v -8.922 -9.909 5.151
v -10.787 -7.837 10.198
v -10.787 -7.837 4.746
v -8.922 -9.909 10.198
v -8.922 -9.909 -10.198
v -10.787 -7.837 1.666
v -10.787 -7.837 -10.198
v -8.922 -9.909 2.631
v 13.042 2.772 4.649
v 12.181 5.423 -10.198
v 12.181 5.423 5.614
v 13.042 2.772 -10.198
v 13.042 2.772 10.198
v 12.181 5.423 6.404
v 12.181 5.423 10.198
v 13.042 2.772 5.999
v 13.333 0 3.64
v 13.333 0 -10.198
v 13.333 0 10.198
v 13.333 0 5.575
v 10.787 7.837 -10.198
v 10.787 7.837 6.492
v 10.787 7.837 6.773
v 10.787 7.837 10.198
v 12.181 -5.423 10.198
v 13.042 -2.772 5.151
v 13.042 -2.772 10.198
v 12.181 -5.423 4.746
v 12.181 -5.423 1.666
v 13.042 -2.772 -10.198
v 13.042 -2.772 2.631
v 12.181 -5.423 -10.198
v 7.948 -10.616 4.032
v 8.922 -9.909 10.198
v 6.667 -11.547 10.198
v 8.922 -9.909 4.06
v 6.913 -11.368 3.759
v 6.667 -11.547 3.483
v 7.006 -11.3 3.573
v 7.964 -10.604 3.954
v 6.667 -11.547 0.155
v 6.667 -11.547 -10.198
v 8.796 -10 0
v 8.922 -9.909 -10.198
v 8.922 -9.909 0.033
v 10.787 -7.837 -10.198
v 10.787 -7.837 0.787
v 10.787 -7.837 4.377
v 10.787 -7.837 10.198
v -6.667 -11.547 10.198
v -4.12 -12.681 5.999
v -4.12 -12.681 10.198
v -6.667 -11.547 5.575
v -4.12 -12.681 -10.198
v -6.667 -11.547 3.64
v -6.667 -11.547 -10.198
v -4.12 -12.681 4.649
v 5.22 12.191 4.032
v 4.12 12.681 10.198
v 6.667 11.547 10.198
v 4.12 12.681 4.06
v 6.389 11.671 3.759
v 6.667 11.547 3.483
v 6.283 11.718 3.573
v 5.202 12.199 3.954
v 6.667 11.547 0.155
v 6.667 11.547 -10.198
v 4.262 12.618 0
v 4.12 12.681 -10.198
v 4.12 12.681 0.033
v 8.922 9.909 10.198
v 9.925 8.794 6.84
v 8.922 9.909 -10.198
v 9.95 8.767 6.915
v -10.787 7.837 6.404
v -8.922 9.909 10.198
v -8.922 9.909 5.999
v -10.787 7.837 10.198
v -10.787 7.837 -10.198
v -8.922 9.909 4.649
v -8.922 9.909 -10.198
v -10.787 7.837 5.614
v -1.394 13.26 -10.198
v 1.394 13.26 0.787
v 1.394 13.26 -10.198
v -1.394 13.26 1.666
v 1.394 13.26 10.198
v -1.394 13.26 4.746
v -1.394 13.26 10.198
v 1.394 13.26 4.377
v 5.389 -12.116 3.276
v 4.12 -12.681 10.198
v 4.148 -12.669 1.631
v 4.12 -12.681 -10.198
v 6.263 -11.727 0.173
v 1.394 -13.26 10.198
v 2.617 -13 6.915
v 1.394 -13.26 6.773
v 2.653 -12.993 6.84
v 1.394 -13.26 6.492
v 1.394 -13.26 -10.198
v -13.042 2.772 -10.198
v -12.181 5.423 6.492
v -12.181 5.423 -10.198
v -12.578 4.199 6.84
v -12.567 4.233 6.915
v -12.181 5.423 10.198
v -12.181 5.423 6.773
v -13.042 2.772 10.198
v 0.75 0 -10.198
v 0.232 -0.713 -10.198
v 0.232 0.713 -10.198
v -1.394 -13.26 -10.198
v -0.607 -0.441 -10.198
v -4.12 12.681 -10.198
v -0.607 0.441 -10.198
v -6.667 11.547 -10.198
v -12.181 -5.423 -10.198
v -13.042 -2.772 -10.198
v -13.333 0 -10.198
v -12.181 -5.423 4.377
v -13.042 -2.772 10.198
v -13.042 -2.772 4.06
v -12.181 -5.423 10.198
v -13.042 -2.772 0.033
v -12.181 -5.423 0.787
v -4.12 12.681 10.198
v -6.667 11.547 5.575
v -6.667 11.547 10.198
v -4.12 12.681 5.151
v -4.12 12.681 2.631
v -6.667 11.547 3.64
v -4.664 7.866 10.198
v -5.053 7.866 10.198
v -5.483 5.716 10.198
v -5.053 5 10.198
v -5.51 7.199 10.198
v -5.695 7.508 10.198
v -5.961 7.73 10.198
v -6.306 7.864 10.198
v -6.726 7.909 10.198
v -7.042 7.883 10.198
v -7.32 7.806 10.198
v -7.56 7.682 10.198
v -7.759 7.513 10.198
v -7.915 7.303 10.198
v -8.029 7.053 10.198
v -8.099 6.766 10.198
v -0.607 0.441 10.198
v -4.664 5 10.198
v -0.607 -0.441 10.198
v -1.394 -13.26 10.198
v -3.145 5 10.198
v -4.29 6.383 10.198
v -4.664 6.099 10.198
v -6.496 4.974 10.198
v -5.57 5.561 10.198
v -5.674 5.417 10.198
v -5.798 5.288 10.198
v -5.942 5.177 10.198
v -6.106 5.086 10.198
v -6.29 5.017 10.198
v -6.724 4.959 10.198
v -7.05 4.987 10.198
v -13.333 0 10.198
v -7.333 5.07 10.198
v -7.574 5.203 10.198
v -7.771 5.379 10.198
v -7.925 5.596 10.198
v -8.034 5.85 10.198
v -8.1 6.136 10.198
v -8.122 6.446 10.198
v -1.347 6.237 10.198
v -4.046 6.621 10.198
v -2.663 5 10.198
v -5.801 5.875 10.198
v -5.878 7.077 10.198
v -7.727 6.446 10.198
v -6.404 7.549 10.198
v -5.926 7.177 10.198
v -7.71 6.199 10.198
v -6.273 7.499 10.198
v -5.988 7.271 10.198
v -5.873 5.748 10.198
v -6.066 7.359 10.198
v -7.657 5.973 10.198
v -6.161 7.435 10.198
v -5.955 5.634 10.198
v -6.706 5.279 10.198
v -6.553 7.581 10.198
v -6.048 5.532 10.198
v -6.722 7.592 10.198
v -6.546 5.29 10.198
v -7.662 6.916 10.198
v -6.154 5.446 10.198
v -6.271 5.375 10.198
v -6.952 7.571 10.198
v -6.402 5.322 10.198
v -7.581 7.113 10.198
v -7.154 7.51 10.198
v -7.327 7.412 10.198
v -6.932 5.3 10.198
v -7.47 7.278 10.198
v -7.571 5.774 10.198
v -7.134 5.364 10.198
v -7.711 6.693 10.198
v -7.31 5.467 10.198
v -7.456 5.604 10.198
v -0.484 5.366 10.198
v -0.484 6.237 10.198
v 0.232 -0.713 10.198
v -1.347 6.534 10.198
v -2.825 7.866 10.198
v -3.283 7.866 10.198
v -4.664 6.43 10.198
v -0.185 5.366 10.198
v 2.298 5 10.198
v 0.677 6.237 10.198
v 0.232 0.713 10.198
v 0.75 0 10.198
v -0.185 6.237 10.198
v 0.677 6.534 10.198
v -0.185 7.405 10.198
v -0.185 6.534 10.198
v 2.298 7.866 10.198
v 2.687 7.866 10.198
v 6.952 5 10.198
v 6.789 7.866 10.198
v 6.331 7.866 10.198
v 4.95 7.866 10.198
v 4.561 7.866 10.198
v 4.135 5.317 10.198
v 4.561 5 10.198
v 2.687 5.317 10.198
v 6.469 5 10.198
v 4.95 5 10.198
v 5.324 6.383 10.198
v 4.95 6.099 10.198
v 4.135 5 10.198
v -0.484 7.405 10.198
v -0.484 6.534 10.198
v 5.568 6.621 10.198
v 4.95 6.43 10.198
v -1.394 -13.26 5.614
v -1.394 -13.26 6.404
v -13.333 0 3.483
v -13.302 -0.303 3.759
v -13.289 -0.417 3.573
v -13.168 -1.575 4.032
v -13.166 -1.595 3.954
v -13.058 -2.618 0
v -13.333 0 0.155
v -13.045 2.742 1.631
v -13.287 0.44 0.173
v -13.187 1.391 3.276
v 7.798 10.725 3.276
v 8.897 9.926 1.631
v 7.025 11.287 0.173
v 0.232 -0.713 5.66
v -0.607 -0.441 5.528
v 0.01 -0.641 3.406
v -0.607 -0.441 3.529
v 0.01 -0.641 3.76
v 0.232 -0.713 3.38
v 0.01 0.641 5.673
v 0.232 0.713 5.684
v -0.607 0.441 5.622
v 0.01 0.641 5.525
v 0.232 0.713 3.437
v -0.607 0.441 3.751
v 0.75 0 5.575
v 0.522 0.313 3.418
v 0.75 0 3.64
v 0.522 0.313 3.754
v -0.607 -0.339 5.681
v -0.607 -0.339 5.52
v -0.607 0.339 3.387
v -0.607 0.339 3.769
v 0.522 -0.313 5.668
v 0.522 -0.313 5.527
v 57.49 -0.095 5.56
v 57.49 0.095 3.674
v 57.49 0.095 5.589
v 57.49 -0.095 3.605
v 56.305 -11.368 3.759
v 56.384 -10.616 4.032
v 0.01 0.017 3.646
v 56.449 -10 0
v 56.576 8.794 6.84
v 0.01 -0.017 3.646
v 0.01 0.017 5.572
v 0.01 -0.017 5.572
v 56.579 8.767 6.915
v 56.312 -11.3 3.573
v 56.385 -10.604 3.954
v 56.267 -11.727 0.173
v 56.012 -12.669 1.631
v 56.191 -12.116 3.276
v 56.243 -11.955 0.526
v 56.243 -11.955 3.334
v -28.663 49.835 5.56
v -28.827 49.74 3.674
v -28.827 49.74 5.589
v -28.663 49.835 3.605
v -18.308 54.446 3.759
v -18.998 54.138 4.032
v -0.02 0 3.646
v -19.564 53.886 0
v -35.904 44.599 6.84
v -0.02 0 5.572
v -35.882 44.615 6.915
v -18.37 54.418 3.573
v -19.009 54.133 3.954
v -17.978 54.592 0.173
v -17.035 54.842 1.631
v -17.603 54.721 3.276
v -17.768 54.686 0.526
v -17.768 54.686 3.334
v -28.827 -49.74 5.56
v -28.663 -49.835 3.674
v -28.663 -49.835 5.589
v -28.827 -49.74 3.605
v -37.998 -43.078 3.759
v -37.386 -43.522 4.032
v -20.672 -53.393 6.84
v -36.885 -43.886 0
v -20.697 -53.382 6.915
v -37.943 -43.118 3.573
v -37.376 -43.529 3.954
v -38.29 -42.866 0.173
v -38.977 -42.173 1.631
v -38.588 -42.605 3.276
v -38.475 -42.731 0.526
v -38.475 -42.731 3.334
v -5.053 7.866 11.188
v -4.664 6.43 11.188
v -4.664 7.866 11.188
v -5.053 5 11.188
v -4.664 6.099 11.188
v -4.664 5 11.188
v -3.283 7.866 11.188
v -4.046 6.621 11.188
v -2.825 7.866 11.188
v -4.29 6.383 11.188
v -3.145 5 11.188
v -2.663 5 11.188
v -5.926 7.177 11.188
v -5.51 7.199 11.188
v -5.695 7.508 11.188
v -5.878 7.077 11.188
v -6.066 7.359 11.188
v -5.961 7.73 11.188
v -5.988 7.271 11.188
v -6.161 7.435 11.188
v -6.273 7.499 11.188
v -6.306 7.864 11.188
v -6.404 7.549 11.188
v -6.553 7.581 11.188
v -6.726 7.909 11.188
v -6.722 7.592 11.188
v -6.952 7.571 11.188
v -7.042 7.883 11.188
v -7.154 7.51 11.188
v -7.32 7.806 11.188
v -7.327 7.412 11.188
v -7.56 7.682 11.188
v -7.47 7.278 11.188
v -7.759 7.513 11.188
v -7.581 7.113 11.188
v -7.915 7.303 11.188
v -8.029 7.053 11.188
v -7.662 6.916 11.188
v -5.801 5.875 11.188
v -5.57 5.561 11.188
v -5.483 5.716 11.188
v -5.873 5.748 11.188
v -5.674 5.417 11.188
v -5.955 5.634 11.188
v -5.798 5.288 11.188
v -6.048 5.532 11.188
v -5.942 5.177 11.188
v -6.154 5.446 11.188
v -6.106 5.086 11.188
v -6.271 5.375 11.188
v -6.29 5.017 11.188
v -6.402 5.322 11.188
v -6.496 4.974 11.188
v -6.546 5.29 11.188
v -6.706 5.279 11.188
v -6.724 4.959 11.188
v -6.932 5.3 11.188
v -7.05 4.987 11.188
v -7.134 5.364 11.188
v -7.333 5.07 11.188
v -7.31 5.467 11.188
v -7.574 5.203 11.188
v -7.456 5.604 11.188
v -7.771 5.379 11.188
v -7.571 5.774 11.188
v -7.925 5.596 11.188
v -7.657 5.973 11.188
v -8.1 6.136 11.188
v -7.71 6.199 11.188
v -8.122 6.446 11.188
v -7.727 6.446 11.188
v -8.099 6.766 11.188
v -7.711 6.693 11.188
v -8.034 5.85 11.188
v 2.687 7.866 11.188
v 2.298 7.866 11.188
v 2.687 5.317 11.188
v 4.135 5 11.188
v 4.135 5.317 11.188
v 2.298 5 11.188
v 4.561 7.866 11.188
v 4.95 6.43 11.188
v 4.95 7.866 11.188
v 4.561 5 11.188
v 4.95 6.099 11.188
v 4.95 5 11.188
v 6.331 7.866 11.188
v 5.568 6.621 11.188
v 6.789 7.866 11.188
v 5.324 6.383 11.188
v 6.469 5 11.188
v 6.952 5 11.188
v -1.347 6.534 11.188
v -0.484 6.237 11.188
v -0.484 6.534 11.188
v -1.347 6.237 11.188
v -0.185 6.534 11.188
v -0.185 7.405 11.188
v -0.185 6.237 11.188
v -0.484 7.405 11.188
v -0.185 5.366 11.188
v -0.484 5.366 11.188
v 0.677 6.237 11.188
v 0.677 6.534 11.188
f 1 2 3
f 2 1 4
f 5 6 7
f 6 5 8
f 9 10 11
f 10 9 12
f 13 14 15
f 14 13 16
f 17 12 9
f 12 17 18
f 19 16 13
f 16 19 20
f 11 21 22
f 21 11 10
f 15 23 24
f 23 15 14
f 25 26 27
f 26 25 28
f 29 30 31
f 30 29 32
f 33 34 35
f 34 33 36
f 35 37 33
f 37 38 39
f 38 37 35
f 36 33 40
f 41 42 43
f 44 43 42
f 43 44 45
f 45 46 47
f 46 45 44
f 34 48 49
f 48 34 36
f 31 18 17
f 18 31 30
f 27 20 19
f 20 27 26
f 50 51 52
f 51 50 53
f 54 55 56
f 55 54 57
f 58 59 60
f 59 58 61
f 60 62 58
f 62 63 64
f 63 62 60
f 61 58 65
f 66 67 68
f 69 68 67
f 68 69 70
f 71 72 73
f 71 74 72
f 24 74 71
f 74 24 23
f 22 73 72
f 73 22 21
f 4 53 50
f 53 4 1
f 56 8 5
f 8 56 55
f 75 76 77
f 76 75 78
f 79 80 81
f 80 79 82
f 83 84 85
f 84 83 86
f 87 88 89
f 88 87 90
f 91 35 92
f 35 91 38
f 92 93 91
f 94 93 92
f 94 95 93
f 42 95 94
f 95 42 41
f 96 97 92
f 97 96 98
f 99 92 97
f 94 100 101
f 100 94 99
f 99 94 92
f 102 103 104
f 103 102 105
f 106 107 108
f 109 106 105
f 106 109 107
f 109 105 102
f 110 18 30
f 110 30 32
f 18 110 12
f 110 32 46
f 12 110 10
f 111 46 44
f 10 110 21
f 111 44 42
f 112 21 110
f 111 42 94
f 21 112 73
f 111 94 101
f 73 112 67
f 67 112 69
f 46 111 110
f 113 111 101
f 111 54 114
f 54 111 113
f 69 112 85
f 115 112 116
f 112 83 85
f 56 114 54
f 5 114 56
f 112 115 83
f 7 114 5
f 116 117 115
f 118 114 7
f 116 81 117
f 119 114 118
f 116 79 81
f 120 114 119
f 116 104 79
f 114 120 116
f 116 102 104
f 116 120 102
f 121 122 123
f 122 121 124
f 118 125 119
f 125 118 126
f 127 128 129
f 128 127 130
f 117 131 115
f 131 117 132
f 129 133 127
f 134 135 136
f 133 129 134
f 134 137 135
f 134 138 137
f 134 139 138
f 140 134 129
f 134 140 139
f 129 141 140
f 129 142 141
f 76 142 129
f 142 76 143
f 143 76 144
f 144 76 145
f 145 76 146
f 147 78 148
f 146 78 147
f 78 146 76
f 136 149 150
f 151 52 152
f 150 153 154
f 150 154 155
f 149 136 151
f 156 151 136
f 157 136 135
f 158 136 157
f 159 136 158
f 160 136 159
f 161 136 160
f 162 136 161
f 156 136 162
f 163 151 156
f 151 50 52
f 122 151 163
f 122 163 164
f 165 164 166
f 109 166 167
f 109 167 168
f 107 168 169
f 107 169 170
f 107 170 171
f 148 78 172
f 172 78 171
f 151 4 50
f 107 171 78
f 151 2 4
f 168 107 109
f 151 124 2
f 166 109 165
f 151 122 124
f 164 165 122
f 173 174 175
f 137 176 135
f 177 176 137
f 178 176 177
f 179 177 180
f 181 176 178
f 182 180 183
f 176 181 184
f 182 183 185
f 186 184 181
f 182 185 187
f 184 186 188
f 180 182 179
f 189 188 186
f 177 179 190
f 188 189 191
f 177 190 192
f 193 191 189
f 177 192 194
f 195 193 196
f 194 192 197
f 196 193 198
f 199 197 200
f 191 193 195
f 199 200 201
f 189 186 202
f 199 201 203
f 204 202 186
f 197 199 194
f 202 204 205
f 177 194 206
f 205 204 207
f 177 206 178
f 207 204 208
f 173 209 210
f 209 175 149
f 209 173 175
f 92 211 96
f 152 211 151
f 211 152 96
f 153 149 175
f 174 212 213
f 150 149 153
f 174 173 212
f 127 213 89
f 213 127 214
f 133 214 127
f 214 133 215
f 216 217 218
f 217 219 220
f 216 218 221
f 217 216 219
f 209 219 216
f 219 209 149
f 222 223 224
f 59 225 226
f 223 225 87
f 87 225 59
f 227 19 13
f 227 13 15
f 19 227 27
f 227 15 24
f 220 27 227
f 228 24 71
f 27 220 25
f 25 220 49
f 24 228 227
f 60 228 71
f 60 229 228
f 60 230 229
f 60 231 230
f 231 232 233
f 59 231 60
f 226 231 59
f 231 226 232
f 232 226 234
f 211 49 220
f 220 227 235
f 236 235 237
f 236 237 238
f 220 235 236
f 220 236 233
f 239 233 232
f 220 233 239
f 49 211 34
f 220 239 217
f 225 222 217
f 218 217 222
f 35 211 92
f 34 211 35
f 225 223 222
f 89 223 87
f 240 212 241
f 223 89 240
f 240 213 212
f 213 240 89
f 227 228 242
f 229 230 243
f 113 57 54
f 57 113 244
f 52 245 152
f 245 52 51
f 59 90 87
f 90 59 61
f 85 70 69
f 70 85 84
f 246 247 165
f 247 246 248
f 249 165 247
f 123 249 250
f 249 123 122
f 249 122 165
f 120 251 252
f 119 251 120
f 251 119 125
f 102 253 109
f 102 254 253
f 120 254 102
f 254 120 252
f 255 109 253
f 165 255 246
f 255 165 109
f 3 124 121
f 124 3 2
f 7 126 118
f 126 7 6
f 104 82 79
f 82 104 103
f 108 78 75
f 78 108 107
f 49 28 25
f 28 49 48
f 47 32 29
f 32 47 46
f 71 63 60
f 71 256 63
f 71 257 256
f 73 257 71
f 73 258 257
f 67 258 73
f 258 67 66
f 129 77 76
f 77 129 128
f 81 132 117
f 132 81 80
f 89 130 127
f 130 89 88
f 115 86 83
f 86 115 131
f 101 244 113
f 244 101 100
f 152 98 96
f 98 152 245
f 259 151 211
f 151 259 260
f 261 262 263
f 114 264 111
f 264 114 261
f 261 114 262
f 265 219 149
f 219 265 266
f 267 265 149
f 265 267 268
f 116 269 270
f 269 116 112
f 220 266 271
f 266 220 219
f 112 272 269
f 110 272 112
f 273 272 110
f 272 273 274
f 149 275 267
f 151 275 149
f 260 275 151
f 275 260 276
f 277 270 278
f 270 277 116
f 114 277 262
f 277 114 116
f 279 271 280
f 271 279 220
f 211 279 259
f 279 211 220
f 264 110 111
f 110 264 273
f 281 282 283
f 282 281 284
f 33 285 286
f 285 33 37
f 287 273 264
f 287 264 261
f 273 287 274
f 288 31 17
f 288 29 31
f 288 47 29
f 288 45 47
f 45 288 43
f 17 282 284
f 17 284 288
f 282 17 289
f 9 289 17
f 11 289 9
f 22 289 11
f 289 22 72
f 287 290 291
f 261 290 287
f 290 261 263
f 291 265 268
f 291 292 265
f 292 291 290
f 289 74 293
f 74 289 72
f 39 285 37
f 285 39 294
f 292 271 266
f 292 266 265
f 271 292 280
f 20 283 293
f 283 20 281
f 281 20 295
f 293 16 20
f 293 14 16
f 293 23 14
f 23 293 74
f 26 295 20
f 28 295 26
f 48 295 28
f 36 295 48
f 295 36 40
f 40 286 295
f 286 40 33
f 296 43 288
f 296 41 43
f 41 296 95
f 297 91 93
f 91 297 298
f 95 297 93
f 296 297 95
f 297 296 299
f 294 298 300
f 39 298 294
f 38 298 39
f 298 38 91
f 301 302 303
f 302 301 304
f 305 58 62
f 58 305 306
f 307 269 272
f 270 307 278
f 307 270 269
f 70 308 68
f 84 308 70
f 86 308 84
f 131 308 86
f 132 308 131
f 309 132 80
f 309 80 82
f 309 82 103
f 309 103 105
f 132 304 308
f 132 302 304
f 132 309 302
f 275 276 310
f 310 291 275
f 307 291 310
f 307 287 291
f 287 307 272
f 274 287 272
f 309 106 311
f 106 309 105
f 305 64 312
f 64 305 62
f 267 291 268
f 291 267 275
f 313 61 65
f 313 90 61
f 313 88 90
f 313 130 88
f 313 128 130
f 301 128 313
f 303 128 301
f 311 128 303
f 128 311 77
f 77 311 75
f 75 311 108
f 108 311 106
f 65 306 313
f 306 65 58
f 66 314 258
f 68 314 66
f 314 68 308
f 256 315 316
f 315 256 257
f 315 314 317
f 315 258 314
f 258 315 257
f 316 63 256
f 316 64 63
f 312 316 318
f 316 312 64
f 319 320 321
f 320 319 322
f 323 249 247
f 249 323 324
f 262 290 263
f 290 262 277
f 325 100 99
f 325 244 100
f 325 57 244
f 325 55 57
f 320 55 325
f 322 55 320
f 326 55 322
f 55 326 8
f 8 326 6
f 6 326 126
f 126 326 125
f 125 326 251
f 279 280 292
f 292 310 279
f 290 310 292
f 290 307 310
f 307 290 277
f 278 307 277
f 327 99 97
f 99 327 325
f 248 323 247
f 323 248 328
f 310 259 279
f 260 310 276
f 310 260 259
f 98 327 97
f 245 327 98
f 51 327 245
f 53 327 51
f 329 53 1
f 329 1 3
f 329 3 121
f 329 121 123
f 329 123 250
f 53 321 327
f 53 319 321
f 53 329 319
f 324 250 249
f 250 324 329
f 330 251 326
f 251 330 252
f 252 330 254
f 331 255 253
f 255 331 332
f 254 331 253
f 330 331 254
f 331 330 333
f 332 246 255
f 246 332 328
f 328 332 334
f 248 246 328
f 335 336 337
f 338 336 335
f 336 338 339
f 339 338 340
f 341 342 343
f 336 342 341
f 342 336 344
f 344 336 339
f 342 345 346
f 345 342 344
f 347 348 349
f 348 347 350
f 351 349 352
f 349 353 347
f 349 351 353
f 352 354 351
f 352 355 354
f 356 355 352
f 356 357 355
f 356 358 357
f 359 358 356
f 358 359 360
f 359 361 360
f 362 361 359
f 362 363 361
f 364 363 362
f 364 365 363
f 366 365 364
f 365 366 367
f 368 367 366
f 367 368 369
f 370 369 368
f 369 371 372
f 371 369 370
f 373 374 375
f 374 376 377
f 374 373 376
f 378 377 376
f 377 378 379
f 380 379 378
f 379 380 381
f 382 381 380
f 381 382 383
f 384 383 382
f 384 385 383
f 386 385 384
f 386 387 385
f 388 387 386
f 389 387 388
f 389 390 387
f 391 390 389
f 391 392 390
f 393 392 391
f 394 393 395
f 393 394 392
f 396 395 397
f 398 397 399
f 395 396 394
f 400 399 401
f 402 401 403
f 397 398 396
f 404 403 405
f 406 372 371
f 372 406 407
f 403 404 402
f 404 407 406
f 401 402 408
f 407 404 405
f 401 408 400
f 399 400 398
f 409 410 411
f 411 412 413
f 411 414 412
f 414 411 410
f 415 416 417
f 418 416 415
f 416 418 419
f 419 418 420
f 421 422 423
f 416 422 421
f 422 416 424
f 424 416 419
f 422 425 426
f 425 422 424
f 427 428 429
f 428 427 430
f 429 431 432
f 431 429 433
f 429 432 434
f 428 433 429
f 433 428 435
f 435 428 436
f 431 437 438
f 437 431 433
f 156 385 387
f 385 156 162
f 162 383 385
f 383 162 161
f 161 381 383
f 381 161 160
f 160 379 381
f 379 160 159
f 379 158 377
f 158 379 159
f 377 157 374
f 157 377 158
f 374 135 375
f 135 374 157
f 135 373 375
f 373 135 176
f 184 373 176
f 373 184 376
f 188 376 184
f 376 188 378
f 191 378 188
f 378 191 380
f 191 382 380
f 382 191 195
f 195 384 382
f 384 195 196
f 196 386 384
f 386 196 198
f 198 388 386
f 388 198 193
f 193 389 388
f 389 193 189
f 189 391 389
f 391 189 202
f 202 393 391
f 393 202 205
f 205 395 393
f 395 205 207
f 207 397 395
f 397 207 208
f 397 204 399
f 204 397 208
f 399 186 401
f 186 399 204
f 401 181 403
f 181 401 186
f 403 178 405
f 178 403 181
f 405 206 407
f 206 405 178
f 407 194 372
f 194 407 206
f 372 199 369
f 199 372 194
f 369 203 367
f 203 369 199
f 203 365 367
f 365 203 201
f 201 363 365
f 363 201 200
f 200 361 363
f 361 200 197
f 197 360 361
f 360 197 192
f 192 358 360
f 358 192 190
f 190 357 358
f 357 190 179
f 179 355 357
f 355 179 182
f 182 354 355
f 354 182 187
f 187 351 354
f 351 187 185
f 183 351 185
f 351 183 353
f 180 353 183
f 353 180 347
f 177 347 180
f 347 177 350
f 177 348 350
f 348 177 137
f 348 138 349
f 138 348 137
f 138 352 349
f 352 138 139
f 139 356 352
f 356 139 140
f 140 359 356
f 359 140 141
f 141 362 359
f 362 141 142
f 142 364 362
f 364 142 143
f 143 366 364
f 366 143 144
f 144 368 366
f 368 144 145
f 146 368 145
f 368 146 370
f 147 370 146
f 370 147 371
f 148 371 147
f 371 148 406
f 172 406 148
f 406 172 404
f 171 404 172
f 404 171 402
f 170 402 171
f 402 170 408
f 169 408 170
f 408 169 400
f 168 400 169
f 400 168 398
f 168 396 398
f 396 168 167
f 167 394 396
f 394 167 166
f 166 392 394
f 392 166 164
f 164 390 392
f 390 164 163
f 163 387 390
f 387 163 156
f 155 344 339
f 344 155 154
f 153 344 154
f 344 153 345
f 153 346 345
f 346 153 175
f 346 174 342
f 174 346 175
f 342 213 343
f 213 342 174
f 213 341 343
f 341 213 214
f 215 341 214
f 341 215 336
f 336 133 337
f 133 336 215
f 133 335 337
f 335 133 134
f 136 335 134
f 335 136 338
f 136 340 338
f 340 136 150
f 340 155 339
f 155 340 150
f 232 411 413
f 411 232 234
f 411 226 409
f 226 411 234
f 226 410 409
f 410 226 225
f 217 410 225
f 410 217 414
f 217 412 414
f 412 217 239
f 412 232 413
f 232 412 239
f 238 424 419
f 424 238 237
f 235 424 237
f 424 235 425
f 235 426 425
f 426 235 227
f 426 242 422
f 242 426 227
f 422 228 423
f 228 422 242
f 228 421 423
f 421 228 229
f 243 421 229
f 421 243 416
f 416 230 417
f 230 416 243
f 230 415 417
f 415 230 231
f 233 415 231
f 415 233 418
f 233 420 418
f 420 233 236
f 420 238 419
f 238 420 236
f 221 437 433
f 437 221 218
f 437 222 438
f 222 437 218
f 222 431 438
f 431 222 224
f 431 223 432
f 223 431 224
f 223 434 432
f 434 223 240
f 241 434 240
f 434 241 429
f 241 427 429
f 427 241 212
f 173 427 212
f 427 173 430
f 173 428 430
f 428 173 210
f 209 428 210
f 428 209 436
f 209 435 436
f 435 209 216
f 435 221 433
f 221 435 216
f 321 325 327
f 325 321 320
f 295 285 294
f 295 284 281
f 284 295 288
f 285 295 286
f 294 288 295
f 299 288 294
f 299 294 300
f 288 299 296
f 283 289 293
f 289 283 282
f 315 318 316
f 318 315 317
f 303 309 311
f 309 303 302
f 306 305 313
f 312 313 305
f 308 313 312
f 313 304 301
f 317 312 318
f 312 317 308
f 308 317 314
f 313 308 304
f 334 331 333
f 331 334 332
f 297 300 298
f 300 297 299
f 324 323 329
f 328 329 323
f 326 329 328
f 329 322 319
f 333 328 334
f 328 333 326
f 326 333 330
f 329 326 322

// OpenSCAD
// Works in openSCAD 2015.03+ || Last updated Oct 2, 2016



// ##################################################
// GLOBALS
// ##################################################


//all units are in mm.
//for inches: <amount in inches> / I
I = 25.4;

NUMBER_BLADES   = 3;
PITCH_ANGLE     = 20;
BLADE_LEN       = 100;
PROP_DIAMETER   = 115;   // whole thing
SHAFT_DIAMETER  = 1.5;
BLADE_THICKNESS = 4;     // at thickest point
BLADE_WIDTH     = 20;

// No touchie.
BLADE_LENGTH    = PROP_DIAMETER/2; //they get clipped off, so it's fine.
HUB_DIAMETER    = BLADE_WIDTH/1.5;
HUB_THICKNESS   = sqrt(pow(BLADE_WIDTH,2) + pow(BLADE_THICKNESS,2));
DELTA           = 0.01;


// ##################################################
// PROTOTYPES
// ##################################################


module blade();
module hub();
module main();
module prop();
	
	
// ##################################################
// DO THINGS
// ##################################################


prop();


// ##################################################
// FUNCTIONS
// ##################################################


module blade() {
	color("yellow")
	translate([0,0,BLADE_THICKNESS/2]) rotate([0,90,0]) {
		cylinder(d=BLADE_THICKNESS, h=BLADE_LENGTH);
	}//
  difference() {
		echo(str("[Prop>blade] Fixing zero-width solid with DELTA=",DELTA,"..."));
		translate([DELTA,0,0]){
			cube([BLADE_LENGTH-2*DELTA, BLADE_WIDTH, BLADE_THICKNESS]);
		}
		rotate([atan(-BLADE_THICKNESS/BLADE_WIDTH),0,0]){
			translate([0,0,BLADE_THICKNESS]){
				cube([BLADE_LENGTH, BLADE_WIDTH, 2*BLADE_THICKNESS]);
			}
		}
	}
}


module hub(){
	color("yellow")
	translate([0,0,0]) {
		difference(){
			cylinder(h=HUB_THICKNESS,r=HUB_DIAMETER); //hub
			translate([0,0,-HUB_THICKNESS/2]){ //hole
				cylinder(h=2*HUB_THICKNESS, d=SHAFT_DIAMETER);
			}
		}
	}
}


module _prop(){ //DNU -- use prop() instead.
	translate([-HUB_DIAMETER+5,5,HUB_THICKNESS-DELTA]){
		color("red"){
			linear_extrude(height=1)
				text("CK + LK",size=3); 
		}
	}
	hub();
	for(i=[0:NUMBER_BLADES-1]){
		translate([0,0,HUB_THICKNESS/2]){
			rotate([0,0,(360/NUMBER_BLADES)*i]){
				translate([0,-BLADE_WIDTH/2,0]){
					rotate([PITCH_ANGLE, 0, 0]){
						blade();
					}
				}
			}
		}
	}
}


module prop(){
	translate([0,0,-HUB_THICKNESS/2]){
		intersection(){
			cylinder(h=HUB_THICKNESS*2,r=PROP_DIAMETER/2);
			_prop();
		}
	}
}
